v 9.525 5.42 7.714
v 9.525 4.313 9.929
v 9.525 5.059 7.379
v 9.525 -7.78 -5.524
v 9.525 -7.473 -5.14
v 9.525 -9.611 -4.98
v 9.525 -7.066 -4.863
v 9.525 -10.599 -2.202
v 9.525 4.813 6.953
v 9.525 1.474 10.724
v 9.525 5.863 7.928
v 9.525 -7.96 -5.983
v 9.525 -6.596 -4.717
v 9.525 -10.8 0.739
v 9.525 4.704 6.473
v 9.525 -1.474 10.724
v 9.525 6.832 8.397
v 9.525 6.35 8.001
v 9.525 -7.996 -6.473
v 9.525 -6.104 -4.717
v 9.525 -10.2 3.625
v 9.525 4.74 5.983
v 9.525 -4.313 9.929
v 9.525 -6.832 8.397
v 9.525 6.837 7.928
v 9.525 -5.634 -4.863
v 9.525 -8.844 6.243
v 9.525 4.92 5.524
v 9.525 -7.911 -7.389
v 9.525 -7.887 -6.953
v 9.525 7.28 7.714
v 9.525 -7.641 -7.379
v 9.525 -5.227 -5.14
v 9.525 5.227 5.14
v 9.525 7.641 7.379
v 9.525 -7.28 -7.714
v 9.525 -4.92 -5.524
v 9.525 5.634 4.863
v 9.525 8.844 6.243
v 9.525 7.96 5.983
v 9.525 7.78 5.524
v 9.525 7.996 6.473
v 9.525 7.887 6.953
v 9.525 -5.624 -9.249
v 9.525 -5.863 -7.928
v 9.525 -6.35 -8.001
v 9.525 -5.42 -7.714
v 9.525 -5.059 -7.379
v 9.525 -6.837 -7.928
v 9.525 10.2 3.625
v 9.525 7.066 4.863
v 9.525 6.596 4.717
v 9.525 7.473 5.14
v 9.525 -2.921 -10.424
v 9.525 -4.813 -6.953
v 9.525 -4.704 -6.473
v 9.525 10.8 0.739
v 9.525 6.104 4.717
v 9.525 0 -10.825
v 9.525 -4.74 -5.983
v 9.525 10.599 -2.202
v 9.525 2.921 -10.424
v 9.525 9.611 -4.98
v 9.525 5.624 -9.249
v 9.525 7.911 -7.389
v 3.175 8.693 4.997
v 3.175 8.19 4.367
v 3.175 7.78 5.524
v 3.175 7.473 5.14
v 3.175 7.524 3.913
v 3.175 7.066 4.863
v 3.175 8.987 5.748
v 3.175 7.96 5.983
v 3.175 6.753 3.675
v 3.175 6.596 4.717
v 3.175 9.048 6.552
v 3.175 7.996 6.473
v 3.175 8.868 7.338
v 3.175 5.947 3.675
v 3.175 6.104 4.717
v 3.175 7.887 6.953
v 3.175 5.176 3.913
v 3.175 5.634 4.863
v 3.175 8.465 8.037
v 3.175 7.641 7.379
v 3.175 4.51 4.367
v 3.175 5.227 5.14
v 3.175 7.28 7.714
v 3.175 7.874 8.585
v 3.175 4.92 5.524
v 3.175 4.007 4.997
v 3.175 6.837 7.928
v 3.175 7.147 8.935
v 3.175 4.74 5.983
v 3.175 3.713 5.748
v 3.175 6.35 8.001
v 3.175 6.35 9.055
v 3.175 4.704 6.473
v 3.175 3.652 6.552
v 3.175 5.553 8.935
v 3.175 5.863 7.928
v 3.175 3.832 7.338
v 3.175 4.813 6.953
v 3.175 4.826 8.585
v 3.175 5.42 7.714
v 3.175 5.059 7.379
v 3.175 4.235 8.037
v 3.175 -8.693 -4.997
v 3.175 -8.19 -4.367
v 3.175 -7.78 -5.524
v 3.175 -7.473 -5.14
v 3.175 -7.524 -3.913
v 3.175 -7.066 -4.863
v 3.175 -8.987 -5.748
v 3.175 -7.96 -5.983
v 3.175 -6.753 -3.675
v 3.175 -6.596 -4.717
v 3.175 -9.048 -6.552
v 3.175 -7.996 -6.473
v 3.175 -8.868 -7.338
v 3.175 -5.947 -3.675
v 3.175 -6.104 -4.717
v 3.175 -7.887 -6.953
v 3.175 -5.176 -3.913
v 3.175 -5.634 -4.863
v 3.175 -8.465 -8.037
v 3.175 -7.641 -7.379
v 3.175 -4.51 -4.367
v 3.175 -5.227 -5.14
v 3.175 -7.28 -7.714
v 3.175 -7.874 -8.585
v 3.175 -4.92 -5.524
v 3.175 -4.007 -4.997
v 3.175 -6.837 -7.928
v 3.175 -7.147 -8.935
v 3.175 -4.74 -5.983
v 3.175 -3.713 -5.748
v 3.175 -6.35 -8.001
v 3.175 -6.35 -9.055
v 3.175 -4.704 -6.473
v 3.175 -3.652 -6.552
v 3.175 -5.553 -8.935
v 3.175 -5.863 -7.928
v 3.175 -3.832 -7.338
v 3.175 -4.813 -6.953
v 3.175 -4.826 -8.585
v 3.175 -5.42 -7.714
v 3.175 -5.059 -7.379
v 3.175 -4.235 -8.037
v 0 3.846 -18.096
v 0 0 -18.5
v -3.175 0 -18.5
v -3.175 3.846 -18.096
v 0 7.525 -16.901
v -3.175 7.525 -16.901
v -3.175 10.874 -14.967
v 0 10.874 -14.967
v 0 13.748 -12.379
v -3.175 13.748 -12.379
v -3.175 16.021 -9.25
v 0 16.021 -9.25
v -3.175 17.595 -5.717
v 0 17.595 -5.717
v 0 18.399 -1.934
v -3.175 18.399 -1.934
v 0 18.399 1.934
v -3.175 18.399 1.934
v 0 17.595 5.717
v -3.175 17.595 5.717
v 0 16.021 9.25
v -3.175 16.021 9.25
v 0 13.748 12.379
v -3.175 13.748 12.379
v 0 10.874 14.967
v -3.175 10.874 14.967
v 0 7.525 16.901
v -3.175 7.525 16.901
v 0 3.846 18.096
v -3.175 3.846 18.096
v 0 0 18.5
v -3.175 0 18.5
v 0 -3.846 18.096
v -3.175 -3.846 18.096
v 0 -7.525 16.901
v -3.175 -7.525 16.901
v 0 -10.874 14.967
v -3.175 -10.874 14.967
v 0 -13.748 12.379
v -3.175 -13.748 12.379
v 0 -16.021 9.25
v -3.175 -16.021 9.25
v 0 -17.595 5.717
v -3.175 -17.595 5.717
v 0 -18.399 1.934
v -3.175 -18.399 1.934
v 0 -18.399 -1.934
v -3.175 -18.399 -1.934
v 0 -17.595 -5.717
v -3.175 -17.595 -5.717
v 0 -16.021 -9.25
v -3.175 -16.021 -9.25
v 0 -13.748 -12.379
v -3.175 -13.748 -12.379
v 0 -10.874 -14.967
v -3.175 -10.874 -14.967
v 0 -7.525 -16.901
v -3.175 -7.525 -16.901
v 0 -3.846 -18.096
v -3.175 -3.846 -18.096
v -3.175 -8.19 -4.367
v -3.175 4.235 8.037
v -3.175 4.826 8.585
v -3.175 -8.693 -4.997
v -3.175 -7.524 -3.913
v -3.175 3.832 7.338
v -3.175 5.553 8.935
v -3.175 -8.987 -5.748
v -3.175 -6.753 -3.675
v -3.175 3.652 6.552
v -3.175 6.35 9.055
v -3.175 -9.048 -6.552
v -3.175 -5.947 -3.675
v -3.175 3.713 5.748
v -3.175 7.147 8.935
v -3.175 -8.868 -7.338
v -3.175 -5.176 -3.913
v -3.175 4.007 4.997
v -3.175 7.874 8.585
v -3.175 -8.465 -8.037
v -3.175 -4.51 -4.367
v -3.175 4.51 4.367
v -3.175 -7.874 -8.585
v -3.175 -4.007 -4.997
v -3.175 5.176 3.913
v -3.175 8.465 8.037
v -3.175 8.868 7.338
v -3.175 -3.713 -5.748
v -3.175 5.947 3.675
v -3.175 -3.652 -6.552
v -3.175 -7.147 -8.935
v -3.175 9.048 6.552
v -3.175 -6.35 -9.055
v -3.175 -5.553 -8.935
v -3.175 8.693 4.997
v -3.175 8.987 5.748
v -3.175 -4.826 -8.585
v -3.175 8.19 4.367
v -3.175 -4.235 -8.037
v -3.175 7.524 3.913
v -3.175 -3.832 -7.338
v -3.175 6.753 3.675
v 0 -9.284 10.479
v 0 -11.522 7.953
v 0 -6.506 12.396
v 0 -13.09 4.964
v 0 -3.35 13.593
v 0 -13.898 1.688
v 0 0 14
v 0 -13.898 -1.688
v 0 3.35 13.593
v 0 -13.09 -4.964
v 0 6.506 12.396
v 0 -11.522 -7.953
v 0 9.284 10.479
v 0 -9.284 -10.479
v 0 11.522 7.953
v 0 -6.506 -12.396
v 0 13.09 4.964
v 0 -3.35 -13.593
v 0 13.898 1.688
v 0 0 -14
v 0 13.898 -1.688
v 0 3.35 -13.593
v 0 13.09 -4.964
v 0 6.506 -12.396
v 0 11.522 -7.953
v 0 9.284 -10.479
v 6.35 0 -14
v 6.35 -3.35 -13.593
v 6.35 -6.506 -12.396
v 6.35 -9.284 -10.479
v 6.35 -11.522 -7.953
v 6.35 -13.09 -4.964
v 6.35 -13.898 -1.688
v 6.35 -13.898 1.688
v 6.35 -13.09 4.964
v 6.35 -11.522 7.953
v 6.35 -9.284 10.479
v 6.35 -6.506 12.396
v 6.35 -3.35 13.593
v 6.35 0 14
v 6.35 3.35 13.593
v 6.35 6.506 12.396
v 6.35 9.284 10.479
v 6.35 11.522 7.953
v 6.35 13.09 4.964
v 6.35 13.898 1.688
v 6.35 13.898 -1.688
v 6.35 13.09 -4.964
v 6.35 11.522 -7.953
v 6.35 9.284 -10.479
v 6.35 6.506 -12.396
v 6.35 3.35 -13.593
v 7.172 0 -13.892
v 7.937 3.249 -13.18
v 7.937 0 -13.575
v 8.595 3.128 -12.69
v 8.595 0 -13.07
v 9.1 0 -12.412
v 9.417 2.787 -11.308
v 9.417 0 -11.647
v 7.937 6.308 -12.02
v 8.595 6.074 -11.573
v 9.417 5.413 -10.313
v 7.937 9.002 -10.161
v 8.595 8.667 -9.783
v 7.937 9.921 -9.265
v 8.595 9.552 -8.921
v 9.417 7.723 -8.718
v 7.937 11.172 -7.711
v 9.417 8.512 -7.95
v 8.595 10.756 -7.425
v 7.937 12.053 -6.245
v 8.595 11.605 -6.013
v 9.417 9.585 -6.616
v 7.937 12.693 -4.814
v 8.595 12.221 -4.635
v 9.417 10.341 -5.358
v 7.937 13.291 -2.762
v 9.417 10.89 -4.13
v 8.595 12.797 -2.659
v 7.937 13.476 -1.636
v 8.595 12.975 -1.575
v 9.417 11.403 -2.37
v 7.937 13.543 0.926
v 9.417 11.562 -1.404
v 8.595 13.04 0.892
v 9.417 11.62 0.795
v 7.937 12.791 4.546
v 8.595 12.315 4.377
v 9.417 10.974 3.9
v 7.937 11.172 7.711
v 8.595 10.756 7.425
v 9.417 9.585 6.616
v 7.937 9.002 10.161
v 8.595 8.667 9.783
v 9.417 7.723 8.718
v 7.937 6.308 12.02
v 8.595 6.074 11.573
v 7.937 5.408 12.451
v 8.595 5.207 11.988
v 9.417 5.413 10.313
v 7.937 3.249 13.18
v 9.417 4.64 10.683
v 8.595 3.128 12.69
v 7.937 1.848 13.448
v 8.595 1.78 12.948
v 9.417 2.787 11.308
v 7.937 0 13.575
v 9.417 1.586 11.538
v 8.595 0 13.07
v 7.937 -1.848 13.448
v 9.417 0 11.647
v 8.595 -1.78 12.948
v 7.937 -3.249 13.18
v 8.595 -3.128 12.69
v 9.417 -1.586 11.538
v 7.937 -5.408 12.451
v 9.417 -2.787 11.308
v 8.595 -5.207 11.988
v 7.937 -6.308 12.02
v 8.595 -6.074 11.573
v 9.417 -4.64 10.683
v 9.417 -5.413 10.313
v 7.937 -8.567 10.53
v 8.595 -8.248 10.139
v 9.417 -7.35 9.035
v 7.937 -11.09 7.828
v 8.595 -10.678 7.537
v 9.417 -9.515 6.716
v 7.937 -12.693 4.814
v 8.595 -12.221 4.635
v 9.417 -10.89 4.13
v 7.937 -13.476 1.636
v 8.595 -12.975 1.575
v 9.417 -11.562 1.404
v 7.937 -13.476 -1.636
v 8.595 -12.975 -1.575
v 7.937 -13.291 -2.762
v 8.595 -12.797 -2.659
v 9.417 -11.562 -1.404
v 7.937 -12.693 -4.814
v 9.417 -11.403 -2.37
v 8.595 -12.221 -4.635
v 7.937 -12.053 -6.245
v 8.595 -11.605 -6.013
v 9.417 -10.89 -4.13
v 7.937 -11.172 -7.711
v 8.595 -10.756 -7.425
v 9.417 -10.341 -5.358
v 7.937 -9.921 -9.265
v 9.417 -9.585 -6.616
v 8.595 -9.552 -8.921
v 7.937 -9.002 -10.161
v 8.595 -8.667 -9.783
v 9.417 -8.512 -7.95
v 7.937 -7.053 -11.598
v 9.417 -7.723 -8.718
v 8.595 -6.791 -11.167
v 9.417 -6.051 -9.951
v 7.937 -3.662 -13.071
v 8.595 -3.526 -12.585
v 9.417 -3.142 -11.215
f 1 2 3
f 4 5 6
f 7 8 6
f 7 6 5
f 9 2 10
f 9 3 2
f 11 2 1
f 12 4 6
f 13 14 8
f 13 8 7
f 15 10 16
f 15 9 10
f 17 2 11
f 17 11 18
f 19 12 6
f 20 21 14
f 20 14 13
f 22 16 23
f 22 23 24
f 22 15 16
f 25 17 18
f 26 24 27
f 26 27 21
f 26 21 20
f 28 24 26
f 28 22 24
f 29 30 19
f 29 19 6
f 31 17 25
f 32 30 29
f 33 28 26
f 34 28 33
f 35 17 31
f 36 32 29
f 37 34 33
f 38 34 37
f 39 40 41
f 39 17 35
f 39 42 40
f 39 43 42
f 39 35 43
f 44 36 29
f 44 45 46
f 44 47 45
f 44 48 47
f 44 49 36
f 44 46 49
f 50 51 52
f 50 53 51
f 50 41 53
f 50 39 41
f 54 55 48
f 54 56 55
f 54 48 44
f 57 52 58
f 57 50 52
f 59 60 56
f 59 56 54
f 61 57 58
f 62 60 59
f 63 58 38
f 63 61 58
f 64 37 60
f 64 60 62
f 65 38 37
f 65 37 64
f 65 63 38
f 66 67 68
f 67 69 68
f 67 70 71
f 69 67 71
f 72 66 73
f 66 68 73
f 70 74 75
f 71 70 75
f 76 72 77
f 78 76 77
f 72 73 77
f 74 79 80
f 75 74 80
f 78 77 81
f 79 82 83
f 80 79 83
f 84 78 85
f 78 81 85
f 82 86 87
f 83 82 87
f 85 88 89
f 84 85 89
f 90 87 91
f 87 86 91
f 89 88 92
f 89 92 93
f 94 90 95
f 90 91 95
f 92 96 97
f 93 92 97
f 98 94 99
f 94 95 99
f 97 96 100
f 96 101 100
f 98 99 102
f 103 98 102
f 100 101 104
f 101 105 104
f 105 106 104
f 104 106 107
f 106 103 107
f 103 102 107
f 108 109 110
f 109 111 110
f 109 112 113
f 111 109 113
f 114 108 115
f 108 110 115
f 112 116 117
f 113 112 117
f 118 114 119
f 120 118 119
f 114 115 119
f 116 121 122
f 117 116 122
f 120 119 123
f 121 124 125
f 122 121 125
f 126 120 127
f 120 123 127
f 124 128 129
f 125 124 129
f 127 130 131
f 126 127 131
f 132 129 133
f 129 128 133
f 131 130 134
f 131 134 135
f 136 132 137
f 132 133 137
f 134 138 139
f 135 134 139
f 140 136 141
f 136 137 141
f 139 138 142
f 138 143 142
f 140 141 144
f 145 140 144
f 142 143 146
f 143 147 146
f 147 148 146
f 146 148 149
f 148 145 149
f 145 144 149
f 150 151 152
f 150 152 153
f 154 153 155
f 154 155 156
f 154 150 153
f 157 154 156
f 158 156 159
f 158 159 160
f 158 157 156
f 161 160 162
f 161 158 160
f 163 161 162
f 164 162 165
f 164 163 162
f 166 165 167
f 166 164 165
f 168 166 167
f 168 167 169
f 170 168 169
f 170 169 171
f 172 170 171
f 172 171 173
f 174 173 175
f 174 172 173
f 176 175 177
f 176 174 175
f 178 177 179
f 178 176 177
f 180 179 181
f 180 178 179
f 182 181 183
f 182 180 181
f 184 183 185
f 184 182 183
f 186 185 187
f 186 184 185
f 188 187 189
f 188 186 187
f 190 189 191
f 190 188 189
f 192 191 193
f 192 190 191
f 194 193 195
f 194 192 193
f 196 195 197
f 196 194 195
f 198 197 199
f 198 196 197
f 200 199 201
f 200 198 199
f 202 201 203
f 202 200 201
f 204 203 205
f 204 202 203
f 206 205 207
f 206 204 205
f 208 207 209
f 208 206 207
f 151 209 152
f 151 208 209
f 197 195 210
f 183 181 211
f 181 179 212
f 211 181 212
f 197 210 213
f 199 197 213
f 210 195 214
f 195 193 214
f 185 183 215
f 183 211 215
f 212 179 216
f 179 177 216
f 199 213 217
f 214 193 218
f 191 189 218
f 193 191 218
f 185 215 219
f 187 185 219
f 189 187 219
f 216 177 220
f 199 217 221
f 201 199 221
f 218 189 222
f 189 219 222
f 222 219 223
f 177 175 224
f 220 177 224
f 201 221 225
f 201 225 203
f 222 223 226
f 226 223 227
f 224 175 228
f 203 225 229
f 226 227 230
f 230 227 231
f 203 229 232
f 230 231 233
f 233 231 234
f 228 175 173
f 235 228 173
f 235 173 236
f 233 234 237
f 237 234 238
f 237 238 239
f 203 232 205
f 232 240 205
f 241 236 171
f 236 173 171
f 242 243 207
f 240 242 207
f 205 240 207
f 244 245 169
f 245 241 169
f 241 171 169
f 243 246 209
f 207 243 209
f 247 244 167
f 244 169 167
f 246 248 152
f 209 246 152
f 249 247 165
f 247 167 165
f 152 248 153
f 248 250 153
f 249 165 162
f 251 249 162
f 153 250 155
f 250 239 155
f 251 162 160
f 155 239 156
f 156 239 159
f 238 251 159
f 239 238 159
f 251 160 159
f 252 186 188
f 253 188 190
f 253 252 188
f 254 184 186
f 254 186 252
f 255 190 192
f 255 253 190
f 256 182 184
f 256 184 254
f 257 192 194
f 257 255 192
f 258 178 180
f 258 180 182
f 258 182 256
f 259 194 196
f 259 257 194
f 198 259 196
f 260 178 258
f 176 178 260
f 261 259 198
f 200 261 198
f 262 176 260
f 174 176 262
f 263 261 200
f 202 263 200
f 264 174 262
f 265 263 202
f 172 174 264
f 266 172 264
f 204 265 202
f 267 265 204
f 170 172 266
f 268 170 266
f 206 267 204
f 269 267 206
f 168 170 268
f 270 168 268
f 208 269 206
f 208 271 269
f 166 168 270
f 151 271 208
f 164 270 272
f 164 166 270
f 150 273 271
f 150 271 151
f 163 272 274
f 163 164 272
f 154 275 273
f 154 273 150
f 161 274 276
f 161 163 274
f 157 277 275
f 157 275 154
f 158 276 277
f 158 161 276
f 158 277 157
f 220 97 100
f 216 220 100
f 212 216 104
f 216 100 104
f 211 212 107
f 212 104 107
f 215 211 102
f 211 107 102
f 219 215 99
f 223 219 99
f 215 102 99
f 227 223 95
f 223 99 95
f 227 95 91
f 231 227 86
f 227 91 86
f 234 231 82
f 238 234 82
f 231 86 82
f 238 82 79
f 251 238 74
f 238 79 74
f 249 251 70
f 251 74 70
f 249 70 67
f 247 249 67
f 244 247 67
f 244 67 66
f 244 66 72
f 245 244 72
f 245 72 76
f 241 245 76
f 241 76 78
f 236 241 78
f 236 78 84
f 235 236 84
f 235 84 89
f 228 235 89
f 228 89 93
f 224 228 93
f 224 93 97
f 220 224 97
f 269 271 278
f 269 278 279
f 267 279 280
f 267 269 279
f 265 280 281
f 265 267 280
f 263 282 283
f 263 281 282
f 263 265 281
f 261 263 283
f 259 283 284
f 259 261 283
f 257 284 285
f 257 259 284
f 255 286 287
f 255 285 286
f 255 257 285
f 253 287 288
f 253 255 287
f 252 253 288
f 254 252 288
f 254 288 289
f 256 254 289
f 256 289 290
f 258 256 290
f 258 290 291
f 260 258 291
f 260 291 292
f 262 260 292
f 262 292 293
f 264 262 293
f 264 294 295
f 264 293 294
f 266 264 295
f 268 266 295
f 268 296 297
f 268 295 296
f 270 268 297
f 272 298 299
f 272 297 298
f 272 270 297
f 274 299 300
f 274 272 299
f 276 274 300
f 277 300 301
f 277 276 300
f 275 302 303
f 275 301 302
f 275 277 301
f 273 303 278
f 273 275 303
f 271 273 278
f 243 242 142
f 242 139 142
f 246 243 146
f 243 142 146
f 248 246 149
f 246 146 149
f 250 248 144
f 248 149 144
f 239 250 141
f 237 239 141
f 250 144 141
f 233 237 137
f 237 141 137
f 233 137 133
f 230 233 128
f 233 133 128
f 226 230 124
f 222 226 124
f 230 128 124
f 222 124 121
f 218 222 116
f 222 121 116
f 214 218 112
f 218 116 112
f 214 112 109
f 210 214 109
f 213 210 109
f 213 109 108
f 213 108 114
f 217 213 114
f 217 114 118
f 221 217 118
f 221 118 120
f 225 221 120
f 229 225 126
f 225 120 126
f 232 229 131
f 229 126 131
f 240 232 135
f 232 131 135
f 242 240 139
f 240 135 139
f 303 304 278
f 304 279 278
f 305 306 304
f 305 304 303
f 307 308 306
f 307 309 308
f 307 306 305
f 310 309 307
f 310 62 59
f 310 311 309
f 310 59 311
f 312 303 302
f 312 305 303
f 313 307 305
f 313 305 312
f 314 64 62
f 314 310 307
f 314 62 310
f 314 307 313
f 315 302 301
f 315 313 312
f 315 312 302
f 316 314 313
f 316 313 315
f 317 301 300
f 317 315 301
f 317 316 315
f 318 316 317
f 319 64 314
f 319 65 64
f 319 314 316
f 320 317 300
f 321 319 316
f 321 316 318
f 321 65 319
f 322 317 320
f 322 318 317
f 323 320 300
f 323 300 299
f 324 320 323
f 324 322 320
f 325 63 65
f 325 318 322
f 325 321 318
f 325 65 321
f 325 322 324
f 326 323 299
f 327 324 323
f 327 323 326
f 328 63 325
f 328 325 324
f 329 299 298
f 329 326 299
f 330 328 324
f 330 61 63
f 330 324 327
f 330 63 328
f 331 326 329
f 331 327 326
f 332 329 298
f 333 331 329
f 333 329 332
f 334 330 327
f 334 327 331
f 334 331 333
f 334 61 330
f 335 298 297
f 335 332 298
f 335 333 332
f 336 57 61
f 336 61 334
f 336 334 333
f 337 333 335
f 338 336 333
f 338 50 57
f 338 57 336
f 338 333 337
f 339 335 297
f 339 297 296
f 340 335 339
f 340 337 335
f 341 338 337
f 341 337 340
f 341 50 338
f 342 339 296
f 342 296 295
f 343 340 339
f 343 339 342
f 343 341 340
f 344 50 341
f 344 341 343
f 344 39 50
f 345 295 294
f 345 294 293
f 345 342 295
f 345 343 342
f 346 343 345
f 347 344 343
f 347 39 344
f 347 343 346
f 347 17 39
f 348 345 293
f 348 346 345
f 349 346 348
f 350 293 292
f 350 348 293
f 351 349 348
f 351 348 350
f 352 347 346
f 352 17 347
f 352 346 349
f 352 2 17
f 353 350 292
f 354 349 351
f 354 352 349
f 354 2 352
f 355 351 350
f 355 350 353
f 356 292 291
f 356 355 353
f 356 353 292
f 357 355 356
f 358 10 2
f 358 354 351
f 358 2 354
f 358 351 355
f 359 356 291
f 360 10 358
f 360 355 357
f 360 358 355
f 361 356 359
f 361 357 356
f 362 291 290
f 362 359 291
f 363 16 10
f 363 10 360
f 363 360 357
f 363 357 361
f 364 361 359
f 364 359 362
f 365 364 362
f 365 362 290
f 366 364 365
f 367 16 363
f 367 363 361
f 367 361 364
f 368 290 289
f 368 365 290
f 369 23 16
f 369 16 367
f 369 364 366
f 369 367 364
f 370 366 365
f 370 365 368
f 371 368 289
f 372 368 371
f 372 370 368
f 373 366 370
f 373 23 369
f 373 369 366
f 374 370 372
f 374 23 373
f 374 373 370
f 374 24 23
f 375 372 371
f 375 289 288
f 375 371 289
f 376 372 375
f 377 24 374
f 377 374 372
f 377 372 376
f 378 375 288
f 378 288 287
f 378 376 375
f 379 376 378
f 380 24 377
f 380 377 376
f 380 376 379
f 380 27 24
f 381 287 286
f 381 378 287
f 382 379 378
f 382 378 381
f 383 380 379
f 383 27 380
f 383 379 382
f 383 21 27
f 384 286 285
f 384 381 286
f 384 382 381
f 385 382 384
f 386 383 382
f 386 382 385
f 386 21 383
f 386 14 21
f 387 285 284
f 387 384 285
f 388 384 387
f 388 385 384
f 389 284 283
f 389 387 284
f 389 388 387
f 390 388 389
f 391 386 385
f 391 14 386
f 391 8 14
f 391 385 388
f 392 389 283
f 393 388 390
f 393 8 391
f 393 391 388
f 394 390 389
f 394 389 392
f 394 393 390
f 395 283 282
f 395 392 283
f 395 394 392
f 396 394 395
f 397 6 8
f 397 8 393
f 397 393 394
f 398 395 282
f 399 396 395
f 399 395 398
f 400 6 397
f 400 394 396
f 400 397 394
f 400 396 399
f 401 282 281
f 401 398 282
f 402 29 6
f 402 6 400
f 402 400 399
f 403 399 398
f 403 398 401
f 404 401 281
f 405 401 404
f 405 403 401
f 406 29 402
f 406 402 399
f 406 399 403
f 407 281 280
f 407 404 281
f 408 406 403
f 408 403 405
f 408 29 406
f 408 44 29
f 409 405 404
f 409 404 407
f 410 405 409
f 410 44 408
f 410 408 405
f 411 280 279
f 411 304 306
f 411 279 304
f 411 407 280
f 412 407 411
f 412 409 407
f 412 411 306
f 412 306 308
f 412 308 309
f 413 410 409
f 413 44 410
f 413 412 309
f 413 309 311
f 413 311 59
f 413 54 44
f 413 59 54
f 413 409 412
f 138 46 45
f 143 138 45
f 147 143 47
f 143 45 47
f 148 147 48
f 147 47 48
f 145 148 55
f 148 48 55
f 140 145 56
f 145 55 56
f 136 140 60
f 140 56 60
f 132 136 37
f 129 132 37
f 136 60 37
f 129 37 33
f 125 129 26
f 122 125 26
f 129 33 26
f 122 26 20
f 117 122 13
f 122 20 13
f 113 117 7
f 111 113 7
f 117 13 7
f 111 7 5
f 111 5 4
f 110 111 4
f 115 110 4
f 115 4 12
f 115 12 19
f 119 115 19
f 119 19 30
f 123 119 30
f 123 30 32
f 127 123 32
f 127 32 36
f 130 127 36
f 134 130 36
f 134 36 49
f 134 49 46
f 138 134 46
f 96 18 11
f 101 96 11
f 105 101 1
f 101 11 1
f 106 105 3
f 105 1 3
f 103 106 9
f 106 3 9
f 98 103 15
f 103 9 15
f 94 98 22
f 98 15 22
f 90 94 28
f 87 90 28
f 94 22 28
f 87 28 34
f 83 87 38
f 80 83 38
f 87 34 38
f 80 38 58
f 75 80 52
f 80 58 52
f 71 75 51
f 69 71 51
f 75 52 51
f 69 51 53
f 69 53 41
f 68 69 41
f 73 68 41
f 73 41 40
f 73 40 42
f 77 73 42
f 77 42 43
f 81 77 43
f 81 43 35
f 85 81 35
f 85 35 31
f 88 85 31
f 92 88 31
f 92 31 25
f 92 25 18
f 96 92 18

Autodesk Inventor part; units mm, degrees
ref_plane "YZ Plane" through (0, 0, 0) normal (1, 0, 0) x (0, 1, 0)
ref_plane "XZ Plane" through (0, 0, 0) normal (0, 1, 0) x (-1, 0, 0)
ref_plane "XY Plane" through (0, 0, 0) normal (0, 0, 1) x (1, 0, 0)
sketch "Sketch1" plane through (0, 0, 0) normal (0, 1, 0) x (-1, 0, 0)
  line L0 (0, 0) -> (3.175, 0)
  line L1 (3.175, 0) -> (3.175, -18.5)
  line L2 (3.175, -18.5) -> (0, -18.5)
  line L3 (0, -18.5) -> (0, 0)
  line L4 (0, 0) -> (-9.525, 0)
  line L5 (-9.525, 0) -> (-9.525, -14)
  line L6 (-9.525, -14) -> (0, -14)
  line L7 (0, -14) -> (0, 0)
  line L8 (5.715, 0) -> (-12.065, 0) projected
  point P0 (0, -14)
  dimension "d0" = 3.175
  dimension "d1" = 18.5
  dimension "d2" = 9.525
  dimension "d3" = 14
revolve "Revolution1" add sketch "Sketch1" angle 360 about axis through (-10, 0, 0) along (1, 0, 0)
sketch "Sketch2" plane through (-3.175, 0, 0) normal (-1, 0, 0) x (0, 0, 1)
  line L0 (0, 0) -> (6.35, 0)
  line L1 (6.35, 0) -> (6.35, 6.35)
  line L2 (6.35, 6.35) -> (0, 6.35)
  line L3 (0, 6.35) -> (0, 0)
  dimension "d5" = 6.35
  dimension "d6" = 6.35
hole "Hole1" at (-3.175, 6.35, 6.35) direction (1, 0, 0) diameter 5.4102 depth 6.35
hole "Hole2" at (-3.175, 6.35, 6.35) direction (1, 0, 0) diameter 3.302 depth 12.7 tip angle 118
pattern_circular "Circular Pattern1" count 2 over 360 about axis through (-10, 0, 0) along (1, 0, 0) of "Hole1", "Hole2"
fillet "Fillet1" radius 3.175 1 edges at (9.525, 0, 14)
properties part number "GL45 bottle cap insert"
